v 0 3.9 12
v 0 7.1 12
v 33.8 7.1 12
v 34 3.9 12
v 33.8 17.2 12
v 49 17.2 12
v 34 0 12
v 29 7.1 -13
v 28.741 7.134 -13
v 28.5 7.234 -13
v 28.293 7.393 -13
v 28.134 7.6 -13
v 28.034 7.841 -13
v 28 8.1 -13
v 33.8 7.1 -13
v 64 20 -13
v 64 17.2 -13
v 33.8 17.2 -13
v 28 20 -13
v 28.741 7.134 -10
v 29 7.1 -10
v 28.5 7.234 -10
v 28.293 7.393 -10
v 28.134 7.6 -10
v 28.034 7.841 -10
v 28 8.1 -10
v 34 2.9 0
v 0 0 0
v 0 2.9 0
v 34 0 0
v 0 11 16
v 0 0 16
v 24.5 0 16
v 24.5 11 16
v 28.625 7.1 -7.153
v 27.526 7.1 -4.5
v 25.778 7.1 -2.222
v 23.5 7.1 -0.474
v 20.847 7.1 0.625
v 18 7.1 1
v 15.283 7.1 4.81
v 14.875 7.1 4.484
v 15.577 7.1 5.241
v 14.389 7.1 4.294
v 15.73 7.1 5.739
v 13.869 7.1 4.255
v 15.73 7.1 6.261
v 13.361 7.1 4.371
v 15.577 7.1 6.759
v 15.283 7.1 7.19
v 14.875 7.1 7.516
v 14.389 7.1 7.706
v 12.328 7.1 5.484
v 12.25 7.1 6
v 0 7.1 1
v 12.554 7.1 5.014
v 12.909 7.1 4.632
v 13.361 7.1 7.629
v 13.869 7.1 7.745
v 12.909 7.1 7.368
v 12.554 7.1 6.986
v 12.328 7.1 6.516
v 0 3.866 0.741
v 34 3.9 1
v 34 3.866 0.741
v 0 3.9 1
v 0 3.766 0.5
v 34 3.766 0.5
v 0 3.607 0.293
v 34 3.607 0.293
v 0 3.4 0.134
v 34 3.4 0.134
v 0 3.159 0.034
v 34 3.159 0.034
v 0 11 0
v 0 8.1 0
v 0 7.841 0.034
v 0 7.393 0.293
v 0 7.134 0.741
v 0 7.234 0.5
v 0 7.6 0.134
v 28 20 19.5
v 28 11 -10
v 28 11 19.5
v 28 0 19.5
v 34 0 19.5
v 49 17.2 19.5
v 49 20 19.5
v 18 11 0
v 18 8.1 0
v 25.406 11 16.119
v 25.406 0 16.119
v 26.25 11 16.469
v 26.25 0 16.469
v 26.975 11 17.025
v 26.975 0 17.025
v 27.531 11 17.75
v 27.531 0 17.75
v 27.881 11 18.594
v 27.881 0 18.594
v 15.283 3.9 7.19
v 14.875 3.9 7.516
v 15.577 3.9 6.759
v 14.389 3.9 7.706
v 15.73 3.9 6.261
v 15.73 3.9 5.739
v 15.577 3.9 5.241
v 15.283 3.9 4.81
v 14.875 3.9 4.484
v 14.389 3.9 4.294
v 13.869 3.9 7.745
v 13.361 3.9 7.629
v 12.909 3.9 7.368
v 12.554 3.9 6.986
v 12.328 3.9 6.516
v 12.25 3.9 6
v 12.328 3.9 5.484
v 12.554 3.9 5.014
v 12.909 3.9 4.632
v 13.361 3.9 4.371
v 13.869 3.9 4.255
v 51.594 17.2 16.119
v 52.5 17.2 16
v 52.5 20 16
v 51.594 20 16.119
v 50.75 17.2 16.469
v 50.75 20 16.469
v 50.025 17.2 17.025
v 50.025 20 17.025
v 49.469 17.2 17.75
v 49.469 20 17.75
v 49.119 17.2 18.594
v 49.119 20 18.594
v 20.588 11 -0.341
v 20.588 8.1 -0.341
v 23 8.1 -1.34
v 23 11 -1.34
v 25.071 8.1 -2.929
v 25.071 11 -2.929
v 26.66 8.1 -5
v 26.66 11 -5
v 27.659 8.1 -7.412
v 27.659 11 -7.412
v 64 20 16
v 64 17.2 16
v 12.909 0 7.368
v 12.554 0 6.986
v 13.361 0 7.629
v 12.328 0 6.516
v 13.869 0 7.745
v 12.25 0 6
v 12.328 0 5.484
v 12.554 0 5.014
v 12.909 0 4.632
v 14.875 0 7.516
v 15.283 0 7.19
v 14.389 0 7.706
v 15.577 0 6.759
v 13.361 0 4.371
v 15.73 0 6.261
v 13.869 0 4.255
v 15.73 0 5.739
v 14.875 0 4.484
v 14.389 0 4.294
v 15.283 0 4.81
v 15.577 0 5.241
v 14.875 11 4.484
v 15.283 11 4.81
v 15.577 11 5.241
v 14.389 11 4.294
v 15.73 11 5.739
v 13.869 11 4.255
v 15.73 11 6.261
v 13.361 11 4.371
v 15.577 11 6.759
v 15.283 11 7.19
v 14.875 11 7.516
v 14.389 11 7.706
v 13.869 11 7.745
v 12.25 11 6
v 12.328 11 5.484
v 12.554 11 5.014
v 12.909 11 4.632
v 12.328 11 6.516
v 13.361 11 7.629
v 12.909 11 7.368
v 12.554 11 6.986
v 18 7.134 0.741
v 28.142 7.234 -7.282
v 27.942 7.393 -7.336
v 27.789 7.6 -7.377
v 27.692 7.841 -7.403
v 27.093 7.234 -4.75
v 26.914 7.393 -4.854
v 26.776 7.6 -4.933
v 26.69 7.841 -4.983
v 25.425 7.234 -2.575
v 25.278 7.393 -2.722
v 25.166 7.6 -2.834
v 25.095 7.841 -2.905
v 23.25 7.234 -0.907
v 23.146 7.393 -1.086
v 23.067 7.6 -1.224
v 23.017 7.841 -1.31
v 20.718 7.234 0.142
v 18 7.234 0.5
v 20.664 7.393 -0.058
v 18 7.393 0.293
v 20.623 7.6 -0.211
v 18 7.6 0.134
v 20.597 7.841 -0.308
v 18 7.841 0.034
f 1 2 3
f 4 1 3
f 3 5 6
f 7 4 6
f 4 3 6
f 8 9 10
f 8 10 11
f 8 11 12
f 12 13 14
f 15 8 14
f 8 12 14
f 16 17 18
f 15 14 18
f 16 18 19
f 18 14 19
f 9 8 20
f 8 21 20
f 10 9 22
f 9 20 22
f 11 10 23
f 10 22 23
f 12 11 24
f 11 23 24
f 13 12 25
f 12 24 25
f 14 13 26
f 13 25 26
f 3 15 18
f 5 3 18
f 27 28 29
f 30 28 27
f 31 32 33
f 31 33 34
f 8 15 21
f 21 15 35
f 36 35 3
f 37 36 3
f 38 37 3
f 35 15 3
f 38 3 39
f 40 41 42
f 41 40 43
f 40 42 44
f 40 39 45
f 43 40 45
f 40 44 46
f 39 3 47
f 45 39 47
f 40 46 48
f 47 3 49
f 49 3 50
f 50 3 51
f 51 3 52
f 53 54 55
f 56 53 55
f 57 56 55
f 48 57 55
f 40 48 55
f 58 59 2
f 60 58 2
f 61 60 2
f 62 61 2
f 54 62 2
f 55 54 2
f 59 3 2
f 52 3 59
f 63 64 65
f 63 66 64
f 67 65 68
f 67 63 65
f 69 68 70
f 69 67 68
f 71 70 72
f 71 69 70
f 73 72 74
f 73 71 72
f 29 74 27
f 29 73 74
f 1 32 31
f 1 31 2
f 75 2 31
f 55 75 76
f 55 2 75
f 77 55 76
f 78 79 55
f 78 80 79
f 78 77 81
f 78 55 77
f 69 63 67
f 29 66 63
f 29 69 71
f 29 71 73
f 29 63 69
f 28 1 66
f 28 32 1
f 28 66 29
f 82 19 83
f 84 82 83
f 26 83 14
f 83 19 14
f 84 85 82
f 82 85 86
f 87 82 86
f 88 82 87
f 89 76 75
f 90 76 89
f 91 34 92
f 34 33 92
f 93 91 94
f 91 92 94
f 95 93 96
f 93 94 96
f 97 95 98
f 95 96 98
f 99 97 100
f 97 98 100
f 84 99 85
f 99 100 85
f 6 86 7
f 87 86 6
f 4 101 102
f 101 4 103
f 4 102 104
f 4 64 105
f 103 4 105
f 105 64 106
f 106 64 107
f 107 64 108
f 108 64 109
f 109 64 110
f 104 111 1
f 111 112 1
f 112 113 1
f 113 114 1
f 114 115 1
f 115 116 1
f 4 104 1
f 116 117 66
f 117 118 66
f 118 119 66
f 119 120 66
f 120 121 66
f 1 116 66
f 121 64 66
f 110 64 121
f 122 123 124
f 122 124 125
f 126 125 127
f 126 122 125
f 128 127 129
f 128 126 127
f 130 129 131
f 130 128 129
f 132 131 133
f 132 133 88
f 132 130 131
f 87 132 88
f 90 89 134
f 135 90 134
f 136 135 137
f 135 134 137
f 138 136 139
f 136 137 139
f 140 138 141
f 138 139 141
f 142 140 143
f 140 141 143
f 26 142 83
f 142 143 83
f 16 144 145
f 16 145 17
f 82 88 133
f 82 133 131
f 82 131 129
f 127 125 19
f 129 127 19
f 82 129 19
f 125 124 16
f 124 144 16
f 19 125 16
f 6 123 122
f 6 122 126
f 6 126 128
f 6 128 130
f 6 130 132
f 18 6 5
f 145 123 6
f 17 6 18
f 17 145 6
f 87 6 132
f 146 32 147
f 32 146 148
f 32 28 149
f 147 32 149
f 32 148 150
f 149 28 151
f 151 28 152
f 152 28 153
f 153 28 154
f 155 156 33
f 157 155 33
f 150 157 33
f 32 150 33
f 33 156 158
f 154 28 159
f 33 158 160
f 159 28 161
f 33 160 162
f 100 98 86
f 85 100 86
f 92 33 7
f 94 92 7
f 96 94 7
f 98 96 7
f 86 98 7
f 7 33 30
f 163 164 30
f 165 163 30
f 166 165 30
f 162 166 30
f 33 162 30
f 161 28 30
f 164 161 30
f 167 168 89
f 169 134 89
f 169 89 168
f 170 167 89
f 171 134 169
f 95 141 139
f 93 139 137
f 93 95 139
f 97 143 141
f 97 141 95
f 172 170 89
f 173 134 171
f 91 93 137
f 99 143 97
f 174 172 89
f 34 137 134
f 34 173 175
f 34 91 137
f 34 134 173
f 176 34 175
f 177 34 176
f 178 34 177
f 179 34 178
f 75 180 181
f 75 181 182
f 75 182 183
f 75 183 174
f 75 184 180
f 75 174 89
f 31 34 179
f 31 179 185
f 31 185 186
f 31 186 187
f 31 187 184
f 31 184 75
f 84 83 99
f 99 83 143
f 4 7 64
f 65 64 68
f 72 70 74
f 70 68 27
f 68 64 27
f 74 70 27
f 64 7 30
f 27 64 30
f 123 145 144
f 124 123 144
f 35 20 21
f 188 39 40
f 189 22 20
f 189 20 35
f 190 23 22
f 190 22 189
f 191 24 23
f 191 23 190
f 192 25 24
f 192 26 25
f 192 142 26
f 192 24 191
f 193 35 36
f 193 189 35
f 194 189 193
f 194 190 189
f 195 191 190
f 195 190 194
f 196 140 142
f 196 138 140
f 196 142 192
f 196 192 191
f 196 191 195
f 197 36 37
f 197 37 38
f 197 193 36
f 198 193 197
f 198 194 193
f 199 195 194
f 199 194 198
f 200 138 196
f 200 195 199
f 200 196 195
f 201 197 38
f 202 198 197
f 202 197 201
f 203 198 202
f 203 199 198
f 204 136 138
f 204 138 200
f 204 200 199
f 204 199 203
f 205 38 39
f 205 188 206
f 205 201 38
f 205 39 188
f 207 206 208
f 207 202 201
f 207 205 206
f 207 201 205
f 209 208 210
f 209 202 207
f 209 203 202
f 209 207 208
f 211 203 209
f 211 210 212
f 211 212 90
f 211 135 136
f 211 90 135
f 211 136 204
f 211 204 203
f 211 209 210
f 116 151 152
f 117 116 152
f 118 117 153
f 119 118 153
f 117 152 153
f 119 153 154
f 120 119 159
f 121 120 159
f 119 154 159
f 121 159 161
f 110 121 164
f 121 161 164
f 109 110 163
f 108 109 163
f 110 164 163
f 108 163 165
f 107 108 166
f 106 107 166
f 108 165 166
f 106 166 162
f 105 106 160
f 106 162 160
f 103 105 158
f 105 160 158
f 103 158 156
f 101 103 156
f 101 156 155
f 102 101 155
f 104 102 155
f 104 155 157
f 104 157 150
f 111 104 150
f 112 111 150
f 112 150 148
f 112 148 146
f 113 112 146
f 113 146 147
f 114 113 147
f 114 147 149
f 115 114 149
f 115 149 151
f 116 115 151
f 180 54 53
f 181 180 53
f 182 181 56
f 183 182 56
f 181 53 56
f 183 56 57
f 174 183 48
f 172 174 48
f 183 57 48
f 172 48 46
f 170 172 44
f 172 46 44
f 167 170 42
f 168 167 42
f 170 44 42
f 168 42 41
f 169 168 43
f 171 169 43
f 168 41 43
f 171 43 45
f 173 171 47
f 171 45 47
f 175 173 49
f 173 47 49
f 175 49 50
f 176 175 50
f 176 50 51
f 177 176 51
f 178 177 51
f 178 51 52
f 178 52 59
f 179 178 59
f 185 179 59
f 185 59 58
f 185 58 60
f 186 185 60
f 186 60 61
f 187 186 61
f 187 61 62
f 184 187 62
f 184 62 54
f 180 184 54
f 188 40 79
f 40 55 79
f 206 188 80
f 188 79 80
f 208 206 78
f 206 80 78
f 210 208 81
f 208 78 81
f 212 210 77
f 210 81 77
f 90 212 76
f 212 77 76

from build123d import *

# Parameters (mm, degrees)
SKETCH_1_W          = 34
SKETCH_1_H          = 16
EXTRUDE_1_DEPTH     = 11
SKETCH_2_W          = 34
SKETCH_2_H          = 3.2
CUT_EXTRUDE_1_DEPTH = 12
HOLE_WIZARD_1_D     = 3.5
SKETCH_6_W          = 6
SKETCH_6_H          = 3.9
EXTRUDE_2_DEPTH     = 13
FILLET_1_R          = 10
SKETCH_7_W          = 6
SKETCH_7_H          = 29
EXTRUDE_3_DEPTH     = 9
SKETCH_8_W          = 29
SKETCH_8_H          = 2.8
EXTRUDE_4_DEPTH     = 30
EXTRUDE_6_DEPTH     = 3.5
FILLET_2_R          = 1
FILLET_3_R          = 3.5
FILLET_4_R          = 3.5
EXTRUDE_7_DEPTH     = 4
SKETCH_12_W         = 0.2
SKETCH_12_H         = 10.1
CUT_EXTRUDE_2_DEPTH = 25


# Some blends are built 0.0001 mm under size
with BuildPart() as part:
    # 草图1 → 凸台-拉伸1 (new body)
    with BuildSketch(Plane(origin=(0, 0, 0), x_dir=(1, 0, 0), z_dir=(0, 1, 0))):
        with Locations((17, -8)):
            Rectangle(SKETCH_1_W, SKETCH_1_H)
    extrude(amount=EXTRUDE_1_DEPTH)

    # 草图2 → 切除-拉伸1 (cut)
    with BuildSketch(Plane(origin=(0, 0, 0), x_dir=(-1, 0, 0), z_dir=(0, 0, -1))):
        with Locations((-17, 5.5)):
            Rectangle(SKETCH_2_W, SKETCH_2_H)
    extrude(amount=-CUT_EXTRUDE_1_DEPTH, mode=Mode.SUBTRACT)

    # 孔1 (through all)
    with Locations(Plane(origin=(0, 11, 0), x_dir=(1, 0, 0), z_dir=(0, 1, 0))):
        with Locations((14, -6)):
            Hole(HOLE_WIZARD_1_D / 2)

    # 草图6 → 凸台-拉伸2 (add)
    with BuildSketch(Plane(origin=(0, 0, 0), x_dir=(-1, 0, 0), z_dir=(0, 0, -1))):
        with Locations((-31, 9.05)):
            Rectangle(SKETCH_6_W, SKETCH_6_H)
    extrude(amount=EXTRUDE_2_DEPTH)

    # 圆角1
    fillet_1_edges = [part.edges().sort_by_distance(p)[0] for p in [
        (28, 9.05, 0),
    ]]
    fillet(fillet_1_edges, radius=FILLET_1_R)

    # 草图7 → 凸台-拉伸3 (add)
    with BuildSketch(Plane(origin=(0, 11, 0), x_dir=(1, 0, 0), z_dir=(0, 1, 0))):
        with Locations((31, -1.5)):
            Rectangle(SKETCH_7_W, SKETCH_7_H)
    extrude(amount=EXTRUDE_3_DEPTH)

    # 草图8 → 凸台-拉伸4 (add)
    with BuildSketch(Plane(origin=(34, 0, 0), x_dir=(0, 0, -1), z_dir=(1, 0, 0))):
        with Locations((-1.5, 18.6)):
            Rectangle(SKETCH_8_W, SKETCH_8_H)
    extrude(amount=EXTRUDE_4_DEPTH)

    # 草图10 → 凸台-拉伸6 (add)
    with BuildSketch(Plane.XY.offset(16)):
        Polygon((28, 0), (34, 0), (34, 17.2), (49, 17.2), (49, 20), (28, 20), (28, 11), align=None)
        Polygon((34, 17.2), (34, 0), (49, 17.2), align=None)
    extrude(amount=EXTRUDE_6_DEPTH)

    # 圆角2
    fillet_2_edges = [part.edges().sort_by_distance(p)[0] for p in [
        (9, 7.1, 0),
        (17, 3.9, 0),
        (28, 7.1, -11.5),
        (25.071067812, 7.1, -2.928932188),
    ]]
    fillet(fillet_2_edges, radius=FILLET_2_R)

    # 圆角3
    fillet_3_edges = [part.edges().sort_by_distance(p)[0] for p in [
        (28, 5.5, 16),
    ]]
    fillet(fillet_3_edges, radius=FILLET_3_R - 0.0001)  # a hair under: the kernel refuses the full size

    # 圆角4
    # the kernel refuses this fillet: 3.5 mm, written as the material it adds along each edge
    with BuildSketch(Plane(origin=(49, 17.2, 16), x_dir=(0, 0, 1), z_dir=(0, 1, 0))) as fillet_4_piece_1:
        with BuildLine():
            CenterArc((FILLET_4_R, FILLET_4_R), FILLET_4_R, 180, 90)
            Line((0, FILLET_4_R), (0, 0))
            Line((0, 0), (FILLET_4_R, 0))
        make_face()
    extrude(amount=2.8)

    # 草图11 → 凸台-拉伸7 (add)
    with BuildSketch(Plane(origin=(0, 0, 16), x_dir=(-1, 0, 0), z_dir=(0, 0, -1))):
        Polygon((-49, 17.2), (-34, 17.2), (-34, 0), align=None)
    extrude(amount=EXTRUDE_7_DEPTH)

    # 草图12 → 切除-拉伸2 (cut)
    with BuildSketch(Plane(origin=(0, 0, -13), x_dir=(-1, 0, 0), z_dir=(0, 0, -1))):
        with Locations((-33.9, 12.15)):
            Rectangle(SKETCH_12_W, SKETCH_12_H)
    extrude(amount=-CUT_EXTRUDE_2_DEPTH, mode=Mode.SUBTRACT)


solid = part.part
